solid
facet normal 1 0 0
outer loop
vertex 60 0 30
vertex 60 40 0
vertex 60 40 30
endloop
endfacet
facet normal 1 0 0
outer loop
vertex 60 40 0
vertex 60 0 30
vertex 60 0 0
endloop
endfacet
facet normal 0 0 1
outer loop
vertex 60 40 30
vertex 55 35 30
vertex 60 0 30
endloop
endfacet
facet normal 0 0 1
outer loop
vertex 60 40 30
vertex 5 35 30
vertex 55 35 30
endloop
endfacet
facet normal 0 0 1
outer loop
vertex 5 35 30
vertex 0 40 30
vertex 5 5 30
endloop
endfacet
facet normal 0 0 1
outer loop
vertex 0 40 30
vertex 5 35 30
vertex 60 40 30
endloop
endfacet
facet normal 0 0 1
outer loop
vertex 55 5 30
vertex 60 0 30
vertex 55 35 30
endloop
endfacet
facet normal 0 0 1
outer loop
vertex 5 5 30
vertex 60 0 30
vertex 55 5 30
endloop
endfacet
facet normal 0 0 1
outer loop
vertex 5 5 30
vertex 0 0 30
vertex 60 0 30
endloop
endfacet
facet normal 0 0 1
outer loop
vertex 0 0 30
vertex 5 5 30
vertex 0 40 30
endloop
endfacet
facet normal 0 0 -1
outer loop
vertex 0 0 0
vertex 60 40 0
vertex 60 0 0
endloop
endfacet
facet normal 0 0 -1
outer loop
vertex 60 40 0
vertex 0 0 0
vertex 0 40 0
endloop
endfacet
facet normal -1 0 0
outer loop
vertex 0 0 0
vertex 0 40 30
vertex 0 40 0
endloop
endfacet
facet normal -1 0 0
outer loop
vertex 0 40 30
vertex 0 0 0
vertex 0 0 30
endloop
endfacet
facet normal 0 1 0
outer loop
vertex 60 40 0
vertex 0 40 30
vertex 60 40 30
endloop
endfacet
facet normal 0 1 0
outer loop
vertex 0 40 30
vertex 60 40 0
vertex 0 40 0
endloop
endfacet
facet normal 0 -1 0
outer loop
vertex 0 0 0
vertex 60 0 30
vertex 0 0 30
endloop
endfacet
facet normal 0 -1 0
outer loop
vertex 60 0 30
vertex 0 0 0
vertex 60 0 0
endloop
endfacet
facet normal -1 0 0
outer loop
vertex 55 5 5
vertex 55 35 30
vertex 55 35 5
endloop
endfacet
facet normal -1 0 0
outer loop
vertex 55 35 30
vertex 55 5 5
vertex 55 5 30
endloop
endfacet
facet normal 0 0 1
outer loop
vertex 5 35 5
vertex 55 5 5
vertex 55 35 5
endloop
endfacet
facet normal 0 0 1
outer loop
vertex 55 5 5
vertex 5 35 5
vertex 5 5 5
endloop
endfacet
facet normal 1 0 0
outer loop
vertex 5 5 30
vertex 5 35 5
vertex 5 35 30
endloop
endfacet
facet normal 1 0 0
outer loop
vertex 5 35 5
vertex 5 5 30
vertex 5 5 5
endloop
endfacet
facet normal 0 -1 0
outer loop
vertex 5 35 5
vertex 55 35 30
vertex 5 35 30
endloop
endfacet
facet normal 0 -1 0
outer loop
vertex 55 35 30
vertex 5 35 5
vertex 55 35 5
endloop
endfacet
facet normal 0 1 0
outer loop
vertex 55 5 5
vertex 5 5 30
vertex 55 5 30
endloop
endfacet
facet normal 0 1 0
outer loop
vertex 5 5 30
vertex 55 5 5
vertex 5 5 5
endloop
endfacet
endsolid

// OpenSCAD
// Parámetros
ancho = 60;
profundidad = 40;
altura = 30;
espesor = 5;

// Caja
difference() {
    cube([ancho, profundidad, altura]);
    translate([espesor, espesor, espesor]) 
        cube([ancho - 2*espesor, profundidad - 2*espesor, altura]);
}
